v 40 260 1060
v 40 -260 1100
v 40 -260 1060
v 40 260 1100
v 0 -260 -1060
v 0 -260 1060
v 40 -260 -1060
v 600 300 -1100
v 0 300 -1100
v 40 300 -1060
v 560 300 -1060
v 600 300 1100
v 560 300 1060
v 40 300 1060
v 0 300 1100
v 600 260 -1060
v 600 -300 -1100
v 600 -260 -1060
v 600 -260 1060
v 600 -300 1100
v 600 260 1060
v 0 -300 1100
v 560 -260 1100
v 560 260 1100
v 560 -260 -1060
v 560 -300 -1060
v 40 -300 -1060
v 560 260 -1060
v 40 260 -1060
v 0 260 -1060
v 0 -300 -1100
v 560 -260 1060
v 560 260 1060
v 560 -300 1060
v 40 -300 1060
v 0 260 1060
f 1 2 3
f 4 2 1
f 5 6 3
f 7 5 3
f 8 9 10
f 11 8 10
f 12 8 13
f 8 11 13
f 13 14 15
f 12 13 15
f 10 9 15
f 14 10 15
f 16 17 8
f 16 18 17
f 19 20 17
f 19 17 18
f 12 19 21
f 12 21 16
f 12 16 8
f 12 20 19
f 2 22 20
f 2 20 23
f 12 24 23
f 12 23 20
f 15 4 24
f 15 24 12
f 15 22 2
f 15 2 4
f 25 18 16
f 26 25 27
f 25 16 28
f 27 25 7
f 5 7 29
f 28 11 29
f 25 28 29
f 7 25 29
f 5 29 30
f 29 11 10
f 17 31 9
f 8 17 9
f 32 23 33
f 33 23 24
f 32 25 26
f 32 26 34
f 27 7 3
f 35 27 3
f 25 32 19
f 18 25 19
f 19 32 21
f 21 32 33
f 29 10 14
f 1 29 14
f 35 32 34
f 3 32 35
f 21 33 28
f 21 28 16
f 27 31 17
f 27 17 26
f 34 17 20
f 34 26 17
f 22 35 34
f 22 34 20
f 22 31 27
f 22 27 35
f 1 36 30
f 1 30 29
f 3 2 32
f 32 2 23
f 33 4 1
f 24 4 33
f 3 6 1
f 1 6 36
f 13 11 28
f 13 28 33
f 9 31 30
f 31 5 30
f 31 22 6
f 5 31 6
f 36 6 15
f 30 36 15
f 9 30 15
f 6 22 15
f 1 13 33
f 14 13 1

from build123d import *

# Parameters (mm, degrees)
F0_W     = 600
F0_H     = 2200
F0_W_2   = 520
F0_H_2   = 2120
F1_DEPTH = 600
F2_W     = 520
F2_H     = 520
F3_DEPTH = 40
F4_W     = 520
F4_H     = 2120
F5_DEPTH = 600


with BuildPart() as f1:
    # F0 (on Right) → F1 (new body)
    with BuildSketch(Plane.YZ):
        Rectangle(F0_W, F0_H)
        Rectangle(F0_W_2, F0_H_2, mode=Mode.SUBTRACT)
    extrude(amount=F1_DEPTH)

    # F2 (on face) → F3 (cut, through all)
    with BuildSketch(Plane.XY.offset(1100)):
        with Locations((300, 0)):
            Rectangle(F2_W, F2_H)
    extrude(amount=-F3_DEPTH, mode=Mode.SUBTRACT)

    # F4 (on face) → F5 (cut, through all)
    with BuildSketch(Plane(origin=(0, 300, 0), x_dir=(-1, 0, 0), z_dir=(0, 1, 0))):
        with Locations((-300, 0)):
            Rectangle(F4_W, F4_H)
    extrude(amount=-F5_DEPTH, mode=Mode.SUBTRACT)


solid = f1.part
